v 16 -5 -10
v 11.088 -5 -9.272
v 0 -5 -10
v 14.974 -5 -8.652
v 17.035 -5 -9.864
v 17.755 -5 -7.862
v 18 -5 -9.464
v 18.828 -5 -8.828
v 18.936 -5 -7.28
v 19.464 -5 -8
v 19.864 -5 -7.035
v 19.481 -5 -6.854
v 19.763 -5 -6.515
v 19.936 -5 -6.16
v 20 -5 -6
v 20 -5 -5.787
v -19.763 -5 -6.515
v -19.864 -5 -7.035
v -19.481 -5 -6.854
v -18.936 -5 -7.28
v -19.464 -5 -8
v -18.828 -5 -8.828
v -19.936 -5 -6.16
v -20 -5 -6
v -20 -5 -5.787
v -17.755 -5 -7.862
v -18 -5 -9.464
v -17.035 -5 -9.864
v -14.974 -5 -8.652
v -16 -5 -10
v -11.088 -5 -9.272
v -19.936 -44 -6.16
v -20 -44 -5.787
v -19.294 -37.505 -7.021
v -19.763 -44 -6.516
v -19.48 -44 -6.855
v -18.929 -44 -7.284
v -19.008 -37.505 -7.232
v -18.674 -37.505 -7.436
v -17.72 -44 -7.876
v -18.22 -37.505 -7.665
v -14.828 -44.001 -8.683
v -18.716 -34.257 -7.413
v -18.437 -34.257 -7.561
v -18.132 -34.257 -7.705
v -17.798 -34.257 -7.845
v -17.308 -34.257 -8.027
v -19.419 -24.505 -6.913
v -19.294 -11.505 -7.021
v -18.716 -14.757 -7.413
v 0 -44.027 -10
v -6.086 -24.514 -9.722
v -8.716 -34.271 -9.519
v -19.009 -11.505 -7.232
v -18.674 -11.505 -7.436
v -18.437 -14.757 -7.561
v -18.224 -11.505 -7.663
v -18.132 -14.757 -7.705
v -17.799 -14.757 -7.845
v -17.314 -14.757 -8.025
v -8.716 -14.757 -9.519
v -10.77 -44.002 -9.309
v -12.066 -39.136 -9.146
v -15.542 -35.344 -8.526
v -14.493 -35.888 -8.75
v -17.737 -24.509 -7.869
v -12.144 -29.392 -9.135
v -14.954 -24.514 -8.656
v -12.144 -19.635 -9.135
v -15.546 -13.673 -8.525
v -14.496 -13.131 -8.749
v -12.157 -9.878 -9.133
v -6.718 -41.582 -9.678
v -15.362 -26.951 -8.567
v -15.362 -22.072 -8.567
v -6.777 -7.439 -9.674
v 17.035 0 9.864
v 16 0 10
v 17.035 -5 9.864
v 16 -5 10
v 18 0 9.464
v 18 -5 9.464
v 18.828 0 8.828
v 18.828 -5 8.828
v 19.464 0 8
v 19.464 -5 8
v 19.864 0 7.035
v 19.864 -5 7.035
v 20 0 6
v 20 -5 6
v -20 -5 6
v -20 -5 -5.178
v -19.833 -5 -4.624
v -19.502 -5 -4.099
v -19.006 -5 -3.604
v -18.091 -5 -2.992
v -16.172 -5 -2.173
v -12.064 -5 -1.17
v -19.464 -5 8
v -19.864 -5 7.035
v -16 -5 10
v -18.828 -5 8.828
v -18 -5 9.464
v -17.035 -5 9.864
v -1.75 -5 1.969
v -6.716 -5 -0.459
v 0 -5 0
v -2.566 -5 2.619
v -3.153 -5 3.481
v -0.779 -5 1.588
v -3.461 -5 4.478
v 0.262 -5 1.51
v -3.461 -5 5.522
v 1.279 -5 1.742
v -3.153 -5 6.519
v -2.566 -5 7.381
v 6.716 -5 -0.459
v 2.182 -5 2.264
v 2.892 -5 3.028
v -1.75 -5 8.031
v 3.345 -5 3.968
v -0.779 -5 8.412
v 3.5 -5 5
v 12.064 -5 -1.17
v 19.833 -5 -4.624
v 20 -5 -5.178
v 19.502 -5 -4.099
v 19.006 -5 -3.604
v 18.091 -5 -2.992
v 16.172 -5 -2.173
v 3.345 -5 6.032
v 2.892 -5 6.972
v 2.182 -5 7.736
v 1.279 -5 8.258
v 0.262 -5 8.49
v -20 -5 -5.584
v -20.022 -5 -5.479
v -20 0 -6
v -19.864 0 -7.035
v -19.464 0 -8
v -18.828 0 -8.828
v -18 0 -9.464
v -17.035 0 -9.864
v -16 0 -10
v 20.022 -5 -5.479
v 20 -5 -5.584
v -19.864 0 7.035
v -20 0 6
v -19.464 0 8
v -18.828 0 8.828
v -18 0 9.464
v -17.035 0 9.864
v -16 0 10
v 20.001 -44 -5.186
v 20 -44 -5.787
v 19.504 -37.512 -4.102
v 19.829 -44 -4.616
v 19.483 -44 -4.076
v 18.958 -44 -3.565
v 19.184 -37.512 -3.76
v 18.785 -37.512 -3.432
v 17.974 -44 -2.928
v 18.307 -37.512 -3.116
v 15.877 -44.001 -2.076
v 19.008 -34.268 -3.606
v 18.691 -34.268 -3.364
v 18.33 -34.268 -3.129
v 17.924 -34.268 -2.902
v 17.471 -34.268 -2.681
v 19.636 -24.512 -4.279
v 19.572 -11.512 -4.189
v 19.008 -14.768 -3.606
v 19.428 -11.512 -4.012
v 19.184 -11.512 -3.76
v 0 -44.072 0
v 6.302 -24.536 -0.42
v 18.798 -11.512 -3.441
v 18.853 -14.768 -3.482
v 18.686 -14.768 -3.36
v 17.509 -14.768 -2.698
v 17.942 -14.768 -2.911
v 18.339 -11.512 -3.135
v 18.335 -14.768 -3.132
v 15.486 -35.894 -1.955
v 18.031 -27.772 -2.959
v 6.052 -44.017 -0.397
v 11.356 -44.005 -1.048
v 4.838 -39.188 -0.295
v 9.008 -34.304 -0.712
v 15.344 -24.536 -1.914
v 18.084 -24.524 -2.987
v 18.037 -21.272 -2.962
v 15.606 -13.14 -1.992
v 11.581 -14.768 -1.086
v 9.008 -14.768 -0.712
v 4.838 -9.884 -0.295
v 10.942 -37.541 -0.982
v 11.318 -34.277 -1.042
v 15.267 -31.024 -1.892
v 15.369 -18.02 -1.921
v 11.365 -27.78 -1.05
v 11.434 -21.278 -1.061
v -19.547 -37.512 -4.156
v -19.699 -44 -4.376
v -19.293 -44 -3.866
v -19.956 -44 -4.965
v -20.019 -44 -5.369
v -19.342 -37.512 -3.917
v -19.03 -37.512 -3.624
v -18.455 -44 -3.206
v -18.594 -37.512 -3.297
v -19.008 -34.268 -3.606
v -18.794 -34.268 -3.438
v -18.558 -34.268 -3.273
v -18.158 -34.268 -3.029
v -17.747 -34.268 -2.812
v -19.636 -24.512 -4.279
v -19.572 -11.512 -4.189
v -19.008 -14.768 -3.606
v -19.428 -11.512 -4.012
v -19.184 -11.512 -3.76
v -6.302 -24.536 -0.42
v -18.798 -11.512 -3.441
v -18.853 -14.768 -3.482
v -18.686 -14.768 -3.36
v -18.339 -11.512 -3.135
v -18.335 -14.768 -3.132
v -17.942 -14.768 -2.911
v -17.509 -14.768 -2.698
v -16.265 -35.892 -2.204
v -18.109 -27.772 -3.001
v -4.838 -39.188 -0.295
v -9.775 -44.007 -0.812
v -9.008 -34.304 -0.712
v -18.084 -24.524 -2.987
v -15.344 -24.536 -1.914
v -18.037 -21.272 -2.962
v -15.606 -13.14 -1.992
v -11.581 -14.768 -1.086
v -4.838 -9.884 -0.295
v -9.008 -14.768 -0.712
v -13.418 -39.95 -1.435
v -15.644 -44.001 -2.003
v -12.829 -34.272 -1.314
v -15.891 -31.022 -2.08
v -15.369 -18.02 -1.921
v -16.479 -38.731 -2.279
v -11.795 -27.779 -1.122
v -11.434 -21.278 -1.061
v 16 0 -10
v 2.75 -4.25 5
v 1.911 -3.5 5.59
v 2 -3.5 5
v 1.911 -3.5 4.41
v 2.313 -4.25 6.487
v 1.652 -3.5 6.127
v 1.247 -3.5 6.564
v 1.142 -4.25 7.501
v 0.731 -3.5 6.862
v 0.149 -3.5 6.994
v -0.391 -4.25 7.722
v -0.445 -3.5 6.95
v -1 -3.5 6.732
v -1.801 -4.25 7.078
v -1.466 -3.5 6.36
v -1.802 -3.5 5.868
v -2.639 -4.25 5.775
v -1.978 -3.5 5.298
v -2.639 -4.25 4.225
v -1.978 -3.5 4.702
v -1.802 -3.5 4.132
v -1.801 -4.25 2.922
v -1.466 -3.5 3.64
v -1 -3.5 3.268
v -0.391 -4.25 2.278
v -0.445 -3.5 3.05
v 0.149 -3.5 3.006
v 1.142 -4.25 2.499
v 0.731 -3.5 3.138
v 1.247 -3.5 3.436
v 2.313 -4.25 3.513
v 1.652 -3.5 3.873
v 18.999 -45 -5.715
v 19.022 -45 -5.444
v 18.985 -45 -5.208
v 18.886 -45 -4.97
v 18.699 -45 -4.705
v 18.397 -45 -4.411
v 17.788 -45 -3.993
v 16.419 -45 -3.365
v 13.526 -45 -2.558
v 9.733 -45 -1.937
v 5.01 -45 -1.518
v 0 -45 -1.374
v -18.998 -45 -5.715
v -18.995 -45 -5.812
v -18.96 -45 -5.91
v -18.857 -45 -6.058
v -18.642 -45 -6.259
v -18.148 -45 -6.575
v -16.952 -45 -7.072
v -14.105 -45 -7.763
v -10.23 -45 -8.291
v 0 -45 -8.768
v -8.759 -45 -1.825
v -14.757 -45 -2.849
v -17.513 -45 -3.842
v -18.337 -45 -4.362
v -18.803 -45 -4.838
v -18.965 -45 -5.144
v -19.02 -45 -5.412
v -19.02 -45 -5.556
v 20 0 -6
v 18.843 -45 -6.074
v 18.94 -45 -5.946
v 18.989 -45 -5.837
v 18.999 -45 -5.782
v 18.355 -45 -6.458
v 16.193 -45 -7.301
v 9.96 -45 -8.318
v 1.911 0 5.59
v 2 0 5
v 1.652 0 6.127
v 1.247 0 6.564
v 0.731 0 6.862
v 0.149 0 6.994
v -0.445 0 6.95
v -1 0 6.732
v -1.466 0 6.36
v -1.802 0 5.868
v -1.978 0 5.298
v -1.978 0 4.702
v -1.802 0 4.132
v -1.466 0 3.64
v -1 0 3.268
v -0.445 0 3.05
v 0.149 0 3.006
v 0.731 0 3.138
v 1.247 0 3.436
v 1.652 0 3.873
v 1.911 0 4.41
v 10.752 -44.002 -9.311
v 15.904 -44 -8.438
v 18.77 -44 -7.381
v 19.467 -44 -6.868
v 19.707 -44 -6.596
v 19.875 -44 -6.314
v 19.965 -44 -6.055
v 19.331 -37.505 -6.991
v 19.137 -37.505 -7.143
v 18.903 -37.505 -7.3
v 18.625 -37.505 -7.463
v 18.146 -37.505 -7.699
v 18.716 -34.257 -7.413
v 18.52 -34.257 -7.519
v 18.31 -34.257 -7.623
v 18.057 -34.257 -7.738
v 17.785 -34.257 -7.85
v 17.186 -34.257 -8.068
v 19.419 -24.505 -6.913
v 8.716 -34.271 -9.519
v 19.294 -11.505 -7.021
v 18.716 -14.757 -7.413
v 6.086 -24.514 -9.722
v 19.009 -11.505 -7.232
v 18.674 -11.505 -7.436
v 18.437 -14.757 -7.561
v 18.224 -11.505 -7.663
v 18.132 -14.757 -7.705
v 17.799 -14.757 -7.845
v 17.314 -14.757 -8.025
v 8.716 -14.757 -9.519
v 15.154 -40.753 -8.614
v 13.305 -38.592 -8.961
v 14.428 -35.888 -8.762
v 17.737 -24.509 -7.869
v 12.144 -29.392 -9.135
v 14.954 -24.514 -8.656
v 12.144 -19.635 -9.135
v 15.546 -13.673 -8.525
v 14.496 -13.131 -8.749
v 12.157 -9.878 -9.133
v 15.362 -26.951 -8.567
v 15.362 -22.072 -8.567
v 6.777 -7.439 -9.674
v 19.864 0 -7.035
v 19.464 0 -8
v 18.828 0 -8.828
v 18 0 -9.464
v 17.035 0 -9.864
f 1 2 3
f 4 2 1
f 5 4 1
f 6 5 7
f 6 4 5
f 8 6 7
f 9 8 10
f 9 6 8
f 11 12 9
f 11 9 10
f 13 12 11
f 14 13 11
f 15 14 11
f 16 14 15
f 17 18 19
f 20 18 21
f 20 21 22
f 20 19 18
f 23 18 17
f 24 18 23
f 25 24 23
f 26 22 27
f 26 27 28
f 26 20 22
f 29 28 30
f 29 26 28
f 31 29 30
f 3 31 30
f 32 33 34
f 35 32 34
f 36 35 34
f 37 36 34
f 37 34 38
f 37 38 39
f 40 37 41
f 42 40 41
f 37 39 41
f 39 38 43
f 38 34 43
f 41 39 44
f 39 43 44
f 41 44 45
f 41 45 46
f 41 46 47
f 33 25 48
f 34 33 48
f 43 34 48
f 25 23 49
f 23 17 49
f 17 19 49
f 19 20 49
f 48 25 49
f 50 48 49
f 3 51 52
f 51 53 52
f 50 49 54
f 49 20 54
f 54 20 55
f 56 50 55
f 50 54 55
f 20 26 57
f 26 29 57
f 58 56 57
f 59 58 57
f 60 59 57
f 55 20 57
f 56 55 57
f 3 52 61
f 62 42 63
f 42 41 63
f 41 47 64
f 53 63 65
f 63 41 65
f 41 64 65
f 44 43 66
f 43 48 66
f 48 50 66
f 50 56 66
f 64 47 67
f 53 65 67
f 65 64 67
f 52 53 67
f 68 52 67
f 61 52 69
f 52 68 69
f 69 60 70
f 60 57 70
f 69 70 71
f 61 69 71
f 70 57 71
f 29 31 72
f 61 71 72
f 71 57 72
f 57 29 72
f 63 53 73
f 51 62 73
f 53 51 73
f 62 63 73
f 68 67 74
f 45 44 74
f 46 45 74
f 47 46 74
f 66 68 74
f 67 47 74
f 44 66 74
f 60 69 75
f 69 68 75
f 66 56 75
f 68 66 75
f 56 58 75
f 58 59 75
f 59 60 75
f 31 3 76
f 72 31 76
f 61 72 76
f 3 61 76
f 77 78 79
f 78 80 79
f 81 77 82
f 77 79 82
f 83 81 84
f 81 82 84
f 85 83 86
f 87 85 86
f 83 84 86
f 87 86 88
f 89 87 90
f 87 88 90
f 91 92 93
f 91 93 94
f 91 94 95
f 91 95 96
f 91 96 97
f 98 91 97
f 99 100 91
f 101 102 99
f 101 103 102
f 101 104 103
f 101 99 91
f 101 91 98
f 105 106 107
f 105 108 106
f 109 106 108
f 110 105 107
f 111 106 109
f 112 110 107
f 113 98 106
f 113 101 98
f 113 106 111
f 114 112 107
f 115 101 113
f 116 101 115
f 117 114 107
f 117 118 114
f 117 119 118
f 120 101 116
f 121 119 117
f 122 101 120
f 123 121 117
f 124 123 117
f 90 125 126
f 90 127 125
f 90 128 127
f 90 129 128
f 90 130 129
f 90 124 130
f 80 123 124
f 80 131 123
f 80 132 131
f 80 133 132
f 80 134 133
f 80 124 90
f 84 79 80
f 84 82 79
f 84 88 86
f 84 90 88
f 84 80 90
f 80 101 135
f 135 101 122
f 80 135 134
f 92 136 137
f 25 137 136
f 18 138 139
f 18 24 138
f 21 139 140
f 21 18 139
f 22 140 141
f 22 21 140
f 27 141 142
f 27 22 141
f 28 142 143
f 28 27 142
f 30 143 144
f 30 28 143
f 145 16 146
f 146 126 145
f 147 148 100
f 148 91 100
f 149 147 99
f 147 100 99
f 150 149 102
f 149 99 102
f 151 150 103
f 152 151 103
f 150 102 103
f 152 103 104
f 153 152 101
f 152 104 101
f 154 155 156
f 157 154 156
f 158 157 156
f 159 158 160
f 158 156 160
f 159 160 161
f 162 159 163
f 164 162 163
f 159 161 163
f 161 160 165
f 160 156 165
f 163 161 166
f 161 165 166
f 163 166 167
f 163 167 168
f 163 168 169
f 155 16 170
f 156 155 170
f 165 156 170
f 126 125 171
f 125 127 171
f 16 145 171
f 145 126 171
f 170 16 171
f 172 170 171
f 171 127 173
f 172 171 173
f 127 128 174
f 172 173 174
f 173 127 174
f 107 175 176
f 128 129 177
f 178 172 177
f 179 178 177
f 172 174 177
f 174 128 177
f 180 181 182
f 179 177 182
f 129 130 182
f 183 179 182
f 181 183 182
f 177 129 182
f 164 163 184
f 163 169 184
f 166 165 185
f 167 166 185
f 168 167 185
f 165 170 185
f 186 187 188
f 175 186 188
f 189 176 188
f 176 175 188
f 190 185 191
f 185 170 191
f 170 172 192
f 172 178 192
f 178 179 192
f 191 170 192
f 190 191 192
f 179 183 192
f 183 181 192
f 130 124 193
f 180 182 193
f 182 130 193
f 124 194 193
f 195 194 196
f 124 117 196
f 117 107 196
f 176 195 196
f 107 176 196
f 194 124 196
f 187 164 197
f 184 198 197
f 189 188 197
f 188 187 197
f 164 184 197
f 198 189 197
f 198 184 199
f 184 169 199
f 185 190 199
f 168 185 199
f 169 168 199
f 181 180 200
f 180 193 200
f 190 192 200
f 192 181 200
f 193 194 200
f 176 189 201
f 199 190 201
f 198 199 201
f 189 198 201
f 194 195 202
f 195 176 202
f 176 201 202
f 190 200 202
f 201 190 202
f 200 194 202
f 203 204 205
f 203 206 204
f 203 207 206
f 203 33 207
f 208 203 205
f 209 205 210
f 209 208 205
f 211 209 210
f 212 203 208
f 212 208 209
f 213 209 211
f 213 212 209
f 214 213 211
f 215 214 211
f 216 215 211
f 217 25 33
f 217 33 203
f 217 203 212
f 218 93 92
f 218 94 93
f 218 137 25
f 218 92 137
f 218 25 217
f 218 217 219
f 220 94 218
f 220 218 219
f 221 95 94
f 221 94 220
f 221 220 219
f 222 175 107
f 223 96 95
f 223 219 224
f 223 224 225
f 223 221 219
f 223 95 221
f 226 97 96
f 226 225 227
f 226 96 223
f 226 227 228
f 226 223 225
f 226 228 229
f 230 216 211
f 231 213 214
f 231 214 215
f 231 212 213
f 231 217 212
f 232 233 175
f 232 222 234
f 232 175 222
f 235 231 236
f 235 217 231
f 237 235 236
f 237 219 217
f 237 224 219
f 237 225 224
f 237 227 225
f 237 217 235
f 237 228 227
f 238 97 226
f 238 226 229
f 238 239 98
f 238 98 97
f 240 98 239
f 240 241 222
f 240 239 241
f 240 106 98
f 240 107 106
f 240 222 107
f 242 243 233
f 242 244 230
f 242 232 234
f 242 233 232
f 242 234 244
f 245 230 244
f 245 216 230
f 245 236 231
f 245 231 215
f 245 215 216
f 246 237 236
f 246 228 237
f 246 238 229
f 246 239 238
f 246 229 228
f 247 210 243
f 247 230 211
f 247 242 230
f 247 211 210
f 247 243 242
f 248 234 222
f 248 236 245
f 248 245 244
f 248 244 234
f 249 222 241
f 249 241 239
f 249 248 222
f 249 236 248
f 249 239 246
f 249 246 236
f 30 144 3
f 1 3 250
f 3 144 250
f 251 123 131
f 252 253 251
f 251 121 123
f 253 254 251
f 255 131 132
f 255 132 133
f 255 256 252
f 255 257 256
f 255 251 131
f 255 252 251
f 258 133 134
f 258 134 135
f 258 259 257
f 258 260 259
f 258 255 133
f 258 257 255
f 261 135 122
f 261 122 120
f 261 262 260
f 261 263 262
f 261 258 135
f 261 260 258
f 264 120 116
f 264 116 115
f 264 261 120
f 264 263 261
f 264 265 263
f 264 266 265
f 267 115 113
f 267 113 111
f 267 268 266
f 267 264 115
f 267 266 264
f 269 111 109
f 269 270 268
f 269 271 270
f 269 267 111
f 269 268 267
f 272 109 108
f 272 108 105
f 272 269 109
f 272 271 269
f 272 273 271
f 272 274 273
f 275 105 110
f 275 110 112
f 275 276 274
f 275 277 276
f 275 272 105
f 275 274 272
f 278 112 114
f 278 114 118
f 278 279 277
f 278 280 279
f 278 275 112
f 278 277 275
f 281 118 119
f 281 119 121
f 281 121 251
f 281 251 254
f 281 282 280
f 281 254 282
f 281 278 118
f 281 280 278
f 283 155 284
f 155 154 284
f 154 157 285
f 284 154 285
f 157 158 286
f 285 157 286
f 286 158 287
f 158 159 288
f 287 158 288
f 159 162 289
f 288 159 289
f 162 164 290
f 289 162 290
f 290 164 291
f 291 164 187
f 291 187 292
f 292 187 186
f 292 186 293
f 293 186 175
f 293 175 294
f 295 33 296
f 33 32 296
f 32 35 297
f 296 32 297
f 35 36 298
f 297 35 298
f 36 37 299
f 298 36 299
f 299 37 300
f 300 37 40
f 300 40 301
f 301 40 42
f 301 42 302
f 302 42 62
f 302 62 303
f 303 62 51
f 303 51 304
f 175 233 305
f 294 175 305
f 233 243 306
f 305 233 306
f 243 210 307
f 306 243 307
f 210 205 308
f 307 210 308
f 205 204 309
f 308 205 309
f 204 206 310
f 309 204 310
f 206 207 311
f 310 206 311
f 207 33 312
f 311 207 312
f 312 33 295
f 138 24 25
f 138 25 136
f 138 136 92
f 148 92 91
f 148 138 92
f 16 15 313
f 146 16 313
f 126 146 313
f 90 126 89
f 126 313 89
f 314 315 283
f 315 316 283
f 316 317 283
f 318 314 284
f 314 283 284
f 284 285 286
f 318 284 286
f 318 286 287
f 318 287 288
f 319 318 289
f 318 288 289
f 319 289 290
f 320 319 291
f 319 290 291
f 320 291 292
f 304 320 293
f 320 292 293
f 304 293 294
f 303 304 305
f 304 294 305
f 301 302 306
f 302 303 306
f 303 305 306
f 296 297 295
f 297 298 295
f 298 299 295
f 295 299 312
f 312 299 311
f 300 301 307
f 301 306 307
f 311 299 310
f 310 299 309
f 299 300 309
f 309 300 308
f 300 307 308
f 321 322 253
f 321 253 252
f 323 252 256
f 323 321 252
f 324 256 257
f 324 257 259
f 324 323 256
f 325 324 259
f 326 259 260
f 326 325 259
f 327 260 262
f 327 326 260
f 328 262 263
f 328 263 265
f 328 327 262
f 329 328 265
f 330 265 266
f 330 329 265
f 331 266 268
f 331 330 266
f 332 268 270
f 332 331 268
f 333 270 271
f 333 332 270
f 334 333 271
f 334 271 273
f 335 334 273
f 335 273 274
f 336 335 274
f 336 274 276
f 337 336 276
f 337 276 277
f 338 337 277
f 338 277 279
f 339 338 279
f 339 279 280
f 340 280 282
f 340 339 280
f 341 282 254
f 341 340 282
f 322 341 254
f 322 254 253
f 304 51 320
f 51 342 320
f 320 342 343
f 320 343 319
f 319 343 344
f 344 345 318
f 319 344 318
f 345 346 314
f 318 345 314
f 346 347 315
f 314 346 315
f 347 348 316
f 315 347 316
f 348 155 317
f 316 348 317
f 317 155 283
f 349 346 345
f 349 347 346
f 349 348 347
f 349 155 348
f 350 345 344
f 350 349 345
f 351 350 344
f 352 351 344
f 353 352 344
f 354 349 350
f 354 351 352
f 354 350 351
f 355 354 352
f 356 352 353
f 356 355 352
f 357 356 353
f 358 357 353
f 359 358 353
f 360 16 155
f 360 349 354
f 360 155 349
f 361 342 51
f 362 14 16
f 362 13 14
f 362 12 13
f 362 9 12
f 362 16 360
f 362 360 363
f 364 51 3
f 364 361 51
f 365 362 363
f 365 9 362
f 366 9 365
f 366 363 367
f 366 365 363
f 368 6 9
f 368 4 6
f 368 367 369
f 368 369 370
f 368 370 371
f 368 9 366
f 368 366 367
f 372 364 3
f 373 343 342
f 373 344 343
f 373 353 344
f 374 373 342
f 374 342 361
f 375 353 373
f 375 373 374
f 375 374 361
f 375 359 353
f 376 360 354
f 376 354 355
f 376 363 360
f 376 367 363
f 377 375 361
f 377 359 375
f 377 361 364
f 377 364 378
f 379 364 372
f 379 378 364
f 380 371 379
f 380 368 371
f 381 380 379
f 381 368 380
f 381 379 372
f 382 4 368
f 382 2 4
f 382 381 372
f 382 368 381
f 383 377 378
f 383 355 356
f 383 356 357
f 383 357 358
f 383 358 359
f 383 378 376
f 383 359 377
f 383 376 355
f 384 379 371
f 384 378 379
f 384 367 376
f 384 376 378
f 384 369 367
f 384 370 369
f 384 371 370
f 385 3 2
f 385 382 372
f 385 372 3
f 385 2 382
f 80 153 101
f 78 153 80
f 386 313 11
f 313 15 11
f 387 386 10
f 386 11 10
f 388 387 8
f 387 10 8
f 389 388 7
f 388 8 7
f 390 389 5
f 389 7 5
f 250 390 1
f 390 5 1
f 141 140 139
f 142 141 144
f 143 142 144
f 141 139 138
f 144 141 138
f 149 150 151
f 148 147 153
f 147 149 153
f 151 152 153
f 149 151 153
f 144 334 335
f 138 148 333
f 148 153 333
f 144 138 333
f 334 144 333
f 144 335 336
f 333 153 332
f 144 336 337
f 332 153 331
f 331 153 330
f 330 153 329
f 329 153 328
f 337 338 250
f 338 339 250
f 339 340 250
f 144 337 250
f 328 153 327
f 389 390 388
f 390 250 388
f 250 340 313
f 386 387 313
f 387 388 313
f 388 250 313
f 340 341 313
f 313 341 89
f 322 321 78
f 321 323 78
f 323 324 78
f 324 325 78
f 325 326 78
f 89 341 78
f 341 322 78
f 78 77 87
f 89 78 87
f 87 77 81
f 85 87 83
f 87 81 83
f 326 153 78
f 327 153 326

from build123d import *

# Parameters (mm, degrees)
SKETCH_W        = 40
SKETCH_H        = 20
SKETCH_R        = 2
PAD_DEPTH       = 5
PAD001_DEPTH    = 40
FILLET_R        = 4
CHAMFER_SIZE    = 1
CHAMFER001_SIZE = 1.5


with BuildPart() as part:
    # Sketch → Pad (new body)
    with BuildSketch(Plane.XZ):
        Rectangle(SKETCH_W, SKETCH_H)
        with Locations((0, 5)):
            Circle(SKETCH_R, mode=Mode.SUBTRACT)
    extrude(amount=PAD_DEPTH)

    # Sketch001 (on Face7 of Pad) → Pad001 (join)
    with BuildSketch(Plane.XZ.offset(5)):
        with BuildLine():
            add(Edge.make_bspline(
                [(-20, -5.78744), (-20.688593, -0.934238), (0, 0)],
                knots=[0, 0, 0, 1, 1, 1], degree=2))
            add(Edge.make_bspline(
                [(20, -5.78744), (20.688593, -0.934238), (0, 0)],
                knots=[0, 0, 0, 1, 1, 1], degree=2))
            add(Edge.make_bspline(
                [(20, -5.78744), (19.908007, -9.418864), (0, -10)],
                knots=[0, 0, 0, 1, 1, 1], degree=2))
            add(Edge.make_bspline(
                [(-20, -5.78744), (-19.908007, -9.418864), (0, -10)],
                knots=[0, 0, 0, 1, 1, 1], degree=2))
        make_face()
    extrude(amount=PAD001_DEPTH)

    # Fillet
    fillet_edges = [part.edges().sort_by_distance(p)[0] for p in [
        (20, -2.5, 10),
        (20, -2.5, -10),
        (-20, -2.5, 10),
        (-20, -2.5, -10),
    ]]
    fillet(fillet_edges, radius=FILLET_R)

    # Chamfer
    chamfer_edges = [part.edges().sort_by_distance(p)[0] for p in [
        (10.984514, -45, -0.988644),
        (-10.984514, -45, -0.988644),
        (-10.562912, -45, -9.332673),
        (10.562912, -45, -9.332673),
    ]]
    chamfer(chamfer_edges, length=CHAMFER_SIZE)

    # Chamfer001
    chamfer001_edges = [part.edges().sort_by_distance(p)[0] for p in [
        (-2, -5, 5),
    ]]
    chamfer(chamfer001_edges, length=CHAMFER001_SIZE)


solid = part.part
